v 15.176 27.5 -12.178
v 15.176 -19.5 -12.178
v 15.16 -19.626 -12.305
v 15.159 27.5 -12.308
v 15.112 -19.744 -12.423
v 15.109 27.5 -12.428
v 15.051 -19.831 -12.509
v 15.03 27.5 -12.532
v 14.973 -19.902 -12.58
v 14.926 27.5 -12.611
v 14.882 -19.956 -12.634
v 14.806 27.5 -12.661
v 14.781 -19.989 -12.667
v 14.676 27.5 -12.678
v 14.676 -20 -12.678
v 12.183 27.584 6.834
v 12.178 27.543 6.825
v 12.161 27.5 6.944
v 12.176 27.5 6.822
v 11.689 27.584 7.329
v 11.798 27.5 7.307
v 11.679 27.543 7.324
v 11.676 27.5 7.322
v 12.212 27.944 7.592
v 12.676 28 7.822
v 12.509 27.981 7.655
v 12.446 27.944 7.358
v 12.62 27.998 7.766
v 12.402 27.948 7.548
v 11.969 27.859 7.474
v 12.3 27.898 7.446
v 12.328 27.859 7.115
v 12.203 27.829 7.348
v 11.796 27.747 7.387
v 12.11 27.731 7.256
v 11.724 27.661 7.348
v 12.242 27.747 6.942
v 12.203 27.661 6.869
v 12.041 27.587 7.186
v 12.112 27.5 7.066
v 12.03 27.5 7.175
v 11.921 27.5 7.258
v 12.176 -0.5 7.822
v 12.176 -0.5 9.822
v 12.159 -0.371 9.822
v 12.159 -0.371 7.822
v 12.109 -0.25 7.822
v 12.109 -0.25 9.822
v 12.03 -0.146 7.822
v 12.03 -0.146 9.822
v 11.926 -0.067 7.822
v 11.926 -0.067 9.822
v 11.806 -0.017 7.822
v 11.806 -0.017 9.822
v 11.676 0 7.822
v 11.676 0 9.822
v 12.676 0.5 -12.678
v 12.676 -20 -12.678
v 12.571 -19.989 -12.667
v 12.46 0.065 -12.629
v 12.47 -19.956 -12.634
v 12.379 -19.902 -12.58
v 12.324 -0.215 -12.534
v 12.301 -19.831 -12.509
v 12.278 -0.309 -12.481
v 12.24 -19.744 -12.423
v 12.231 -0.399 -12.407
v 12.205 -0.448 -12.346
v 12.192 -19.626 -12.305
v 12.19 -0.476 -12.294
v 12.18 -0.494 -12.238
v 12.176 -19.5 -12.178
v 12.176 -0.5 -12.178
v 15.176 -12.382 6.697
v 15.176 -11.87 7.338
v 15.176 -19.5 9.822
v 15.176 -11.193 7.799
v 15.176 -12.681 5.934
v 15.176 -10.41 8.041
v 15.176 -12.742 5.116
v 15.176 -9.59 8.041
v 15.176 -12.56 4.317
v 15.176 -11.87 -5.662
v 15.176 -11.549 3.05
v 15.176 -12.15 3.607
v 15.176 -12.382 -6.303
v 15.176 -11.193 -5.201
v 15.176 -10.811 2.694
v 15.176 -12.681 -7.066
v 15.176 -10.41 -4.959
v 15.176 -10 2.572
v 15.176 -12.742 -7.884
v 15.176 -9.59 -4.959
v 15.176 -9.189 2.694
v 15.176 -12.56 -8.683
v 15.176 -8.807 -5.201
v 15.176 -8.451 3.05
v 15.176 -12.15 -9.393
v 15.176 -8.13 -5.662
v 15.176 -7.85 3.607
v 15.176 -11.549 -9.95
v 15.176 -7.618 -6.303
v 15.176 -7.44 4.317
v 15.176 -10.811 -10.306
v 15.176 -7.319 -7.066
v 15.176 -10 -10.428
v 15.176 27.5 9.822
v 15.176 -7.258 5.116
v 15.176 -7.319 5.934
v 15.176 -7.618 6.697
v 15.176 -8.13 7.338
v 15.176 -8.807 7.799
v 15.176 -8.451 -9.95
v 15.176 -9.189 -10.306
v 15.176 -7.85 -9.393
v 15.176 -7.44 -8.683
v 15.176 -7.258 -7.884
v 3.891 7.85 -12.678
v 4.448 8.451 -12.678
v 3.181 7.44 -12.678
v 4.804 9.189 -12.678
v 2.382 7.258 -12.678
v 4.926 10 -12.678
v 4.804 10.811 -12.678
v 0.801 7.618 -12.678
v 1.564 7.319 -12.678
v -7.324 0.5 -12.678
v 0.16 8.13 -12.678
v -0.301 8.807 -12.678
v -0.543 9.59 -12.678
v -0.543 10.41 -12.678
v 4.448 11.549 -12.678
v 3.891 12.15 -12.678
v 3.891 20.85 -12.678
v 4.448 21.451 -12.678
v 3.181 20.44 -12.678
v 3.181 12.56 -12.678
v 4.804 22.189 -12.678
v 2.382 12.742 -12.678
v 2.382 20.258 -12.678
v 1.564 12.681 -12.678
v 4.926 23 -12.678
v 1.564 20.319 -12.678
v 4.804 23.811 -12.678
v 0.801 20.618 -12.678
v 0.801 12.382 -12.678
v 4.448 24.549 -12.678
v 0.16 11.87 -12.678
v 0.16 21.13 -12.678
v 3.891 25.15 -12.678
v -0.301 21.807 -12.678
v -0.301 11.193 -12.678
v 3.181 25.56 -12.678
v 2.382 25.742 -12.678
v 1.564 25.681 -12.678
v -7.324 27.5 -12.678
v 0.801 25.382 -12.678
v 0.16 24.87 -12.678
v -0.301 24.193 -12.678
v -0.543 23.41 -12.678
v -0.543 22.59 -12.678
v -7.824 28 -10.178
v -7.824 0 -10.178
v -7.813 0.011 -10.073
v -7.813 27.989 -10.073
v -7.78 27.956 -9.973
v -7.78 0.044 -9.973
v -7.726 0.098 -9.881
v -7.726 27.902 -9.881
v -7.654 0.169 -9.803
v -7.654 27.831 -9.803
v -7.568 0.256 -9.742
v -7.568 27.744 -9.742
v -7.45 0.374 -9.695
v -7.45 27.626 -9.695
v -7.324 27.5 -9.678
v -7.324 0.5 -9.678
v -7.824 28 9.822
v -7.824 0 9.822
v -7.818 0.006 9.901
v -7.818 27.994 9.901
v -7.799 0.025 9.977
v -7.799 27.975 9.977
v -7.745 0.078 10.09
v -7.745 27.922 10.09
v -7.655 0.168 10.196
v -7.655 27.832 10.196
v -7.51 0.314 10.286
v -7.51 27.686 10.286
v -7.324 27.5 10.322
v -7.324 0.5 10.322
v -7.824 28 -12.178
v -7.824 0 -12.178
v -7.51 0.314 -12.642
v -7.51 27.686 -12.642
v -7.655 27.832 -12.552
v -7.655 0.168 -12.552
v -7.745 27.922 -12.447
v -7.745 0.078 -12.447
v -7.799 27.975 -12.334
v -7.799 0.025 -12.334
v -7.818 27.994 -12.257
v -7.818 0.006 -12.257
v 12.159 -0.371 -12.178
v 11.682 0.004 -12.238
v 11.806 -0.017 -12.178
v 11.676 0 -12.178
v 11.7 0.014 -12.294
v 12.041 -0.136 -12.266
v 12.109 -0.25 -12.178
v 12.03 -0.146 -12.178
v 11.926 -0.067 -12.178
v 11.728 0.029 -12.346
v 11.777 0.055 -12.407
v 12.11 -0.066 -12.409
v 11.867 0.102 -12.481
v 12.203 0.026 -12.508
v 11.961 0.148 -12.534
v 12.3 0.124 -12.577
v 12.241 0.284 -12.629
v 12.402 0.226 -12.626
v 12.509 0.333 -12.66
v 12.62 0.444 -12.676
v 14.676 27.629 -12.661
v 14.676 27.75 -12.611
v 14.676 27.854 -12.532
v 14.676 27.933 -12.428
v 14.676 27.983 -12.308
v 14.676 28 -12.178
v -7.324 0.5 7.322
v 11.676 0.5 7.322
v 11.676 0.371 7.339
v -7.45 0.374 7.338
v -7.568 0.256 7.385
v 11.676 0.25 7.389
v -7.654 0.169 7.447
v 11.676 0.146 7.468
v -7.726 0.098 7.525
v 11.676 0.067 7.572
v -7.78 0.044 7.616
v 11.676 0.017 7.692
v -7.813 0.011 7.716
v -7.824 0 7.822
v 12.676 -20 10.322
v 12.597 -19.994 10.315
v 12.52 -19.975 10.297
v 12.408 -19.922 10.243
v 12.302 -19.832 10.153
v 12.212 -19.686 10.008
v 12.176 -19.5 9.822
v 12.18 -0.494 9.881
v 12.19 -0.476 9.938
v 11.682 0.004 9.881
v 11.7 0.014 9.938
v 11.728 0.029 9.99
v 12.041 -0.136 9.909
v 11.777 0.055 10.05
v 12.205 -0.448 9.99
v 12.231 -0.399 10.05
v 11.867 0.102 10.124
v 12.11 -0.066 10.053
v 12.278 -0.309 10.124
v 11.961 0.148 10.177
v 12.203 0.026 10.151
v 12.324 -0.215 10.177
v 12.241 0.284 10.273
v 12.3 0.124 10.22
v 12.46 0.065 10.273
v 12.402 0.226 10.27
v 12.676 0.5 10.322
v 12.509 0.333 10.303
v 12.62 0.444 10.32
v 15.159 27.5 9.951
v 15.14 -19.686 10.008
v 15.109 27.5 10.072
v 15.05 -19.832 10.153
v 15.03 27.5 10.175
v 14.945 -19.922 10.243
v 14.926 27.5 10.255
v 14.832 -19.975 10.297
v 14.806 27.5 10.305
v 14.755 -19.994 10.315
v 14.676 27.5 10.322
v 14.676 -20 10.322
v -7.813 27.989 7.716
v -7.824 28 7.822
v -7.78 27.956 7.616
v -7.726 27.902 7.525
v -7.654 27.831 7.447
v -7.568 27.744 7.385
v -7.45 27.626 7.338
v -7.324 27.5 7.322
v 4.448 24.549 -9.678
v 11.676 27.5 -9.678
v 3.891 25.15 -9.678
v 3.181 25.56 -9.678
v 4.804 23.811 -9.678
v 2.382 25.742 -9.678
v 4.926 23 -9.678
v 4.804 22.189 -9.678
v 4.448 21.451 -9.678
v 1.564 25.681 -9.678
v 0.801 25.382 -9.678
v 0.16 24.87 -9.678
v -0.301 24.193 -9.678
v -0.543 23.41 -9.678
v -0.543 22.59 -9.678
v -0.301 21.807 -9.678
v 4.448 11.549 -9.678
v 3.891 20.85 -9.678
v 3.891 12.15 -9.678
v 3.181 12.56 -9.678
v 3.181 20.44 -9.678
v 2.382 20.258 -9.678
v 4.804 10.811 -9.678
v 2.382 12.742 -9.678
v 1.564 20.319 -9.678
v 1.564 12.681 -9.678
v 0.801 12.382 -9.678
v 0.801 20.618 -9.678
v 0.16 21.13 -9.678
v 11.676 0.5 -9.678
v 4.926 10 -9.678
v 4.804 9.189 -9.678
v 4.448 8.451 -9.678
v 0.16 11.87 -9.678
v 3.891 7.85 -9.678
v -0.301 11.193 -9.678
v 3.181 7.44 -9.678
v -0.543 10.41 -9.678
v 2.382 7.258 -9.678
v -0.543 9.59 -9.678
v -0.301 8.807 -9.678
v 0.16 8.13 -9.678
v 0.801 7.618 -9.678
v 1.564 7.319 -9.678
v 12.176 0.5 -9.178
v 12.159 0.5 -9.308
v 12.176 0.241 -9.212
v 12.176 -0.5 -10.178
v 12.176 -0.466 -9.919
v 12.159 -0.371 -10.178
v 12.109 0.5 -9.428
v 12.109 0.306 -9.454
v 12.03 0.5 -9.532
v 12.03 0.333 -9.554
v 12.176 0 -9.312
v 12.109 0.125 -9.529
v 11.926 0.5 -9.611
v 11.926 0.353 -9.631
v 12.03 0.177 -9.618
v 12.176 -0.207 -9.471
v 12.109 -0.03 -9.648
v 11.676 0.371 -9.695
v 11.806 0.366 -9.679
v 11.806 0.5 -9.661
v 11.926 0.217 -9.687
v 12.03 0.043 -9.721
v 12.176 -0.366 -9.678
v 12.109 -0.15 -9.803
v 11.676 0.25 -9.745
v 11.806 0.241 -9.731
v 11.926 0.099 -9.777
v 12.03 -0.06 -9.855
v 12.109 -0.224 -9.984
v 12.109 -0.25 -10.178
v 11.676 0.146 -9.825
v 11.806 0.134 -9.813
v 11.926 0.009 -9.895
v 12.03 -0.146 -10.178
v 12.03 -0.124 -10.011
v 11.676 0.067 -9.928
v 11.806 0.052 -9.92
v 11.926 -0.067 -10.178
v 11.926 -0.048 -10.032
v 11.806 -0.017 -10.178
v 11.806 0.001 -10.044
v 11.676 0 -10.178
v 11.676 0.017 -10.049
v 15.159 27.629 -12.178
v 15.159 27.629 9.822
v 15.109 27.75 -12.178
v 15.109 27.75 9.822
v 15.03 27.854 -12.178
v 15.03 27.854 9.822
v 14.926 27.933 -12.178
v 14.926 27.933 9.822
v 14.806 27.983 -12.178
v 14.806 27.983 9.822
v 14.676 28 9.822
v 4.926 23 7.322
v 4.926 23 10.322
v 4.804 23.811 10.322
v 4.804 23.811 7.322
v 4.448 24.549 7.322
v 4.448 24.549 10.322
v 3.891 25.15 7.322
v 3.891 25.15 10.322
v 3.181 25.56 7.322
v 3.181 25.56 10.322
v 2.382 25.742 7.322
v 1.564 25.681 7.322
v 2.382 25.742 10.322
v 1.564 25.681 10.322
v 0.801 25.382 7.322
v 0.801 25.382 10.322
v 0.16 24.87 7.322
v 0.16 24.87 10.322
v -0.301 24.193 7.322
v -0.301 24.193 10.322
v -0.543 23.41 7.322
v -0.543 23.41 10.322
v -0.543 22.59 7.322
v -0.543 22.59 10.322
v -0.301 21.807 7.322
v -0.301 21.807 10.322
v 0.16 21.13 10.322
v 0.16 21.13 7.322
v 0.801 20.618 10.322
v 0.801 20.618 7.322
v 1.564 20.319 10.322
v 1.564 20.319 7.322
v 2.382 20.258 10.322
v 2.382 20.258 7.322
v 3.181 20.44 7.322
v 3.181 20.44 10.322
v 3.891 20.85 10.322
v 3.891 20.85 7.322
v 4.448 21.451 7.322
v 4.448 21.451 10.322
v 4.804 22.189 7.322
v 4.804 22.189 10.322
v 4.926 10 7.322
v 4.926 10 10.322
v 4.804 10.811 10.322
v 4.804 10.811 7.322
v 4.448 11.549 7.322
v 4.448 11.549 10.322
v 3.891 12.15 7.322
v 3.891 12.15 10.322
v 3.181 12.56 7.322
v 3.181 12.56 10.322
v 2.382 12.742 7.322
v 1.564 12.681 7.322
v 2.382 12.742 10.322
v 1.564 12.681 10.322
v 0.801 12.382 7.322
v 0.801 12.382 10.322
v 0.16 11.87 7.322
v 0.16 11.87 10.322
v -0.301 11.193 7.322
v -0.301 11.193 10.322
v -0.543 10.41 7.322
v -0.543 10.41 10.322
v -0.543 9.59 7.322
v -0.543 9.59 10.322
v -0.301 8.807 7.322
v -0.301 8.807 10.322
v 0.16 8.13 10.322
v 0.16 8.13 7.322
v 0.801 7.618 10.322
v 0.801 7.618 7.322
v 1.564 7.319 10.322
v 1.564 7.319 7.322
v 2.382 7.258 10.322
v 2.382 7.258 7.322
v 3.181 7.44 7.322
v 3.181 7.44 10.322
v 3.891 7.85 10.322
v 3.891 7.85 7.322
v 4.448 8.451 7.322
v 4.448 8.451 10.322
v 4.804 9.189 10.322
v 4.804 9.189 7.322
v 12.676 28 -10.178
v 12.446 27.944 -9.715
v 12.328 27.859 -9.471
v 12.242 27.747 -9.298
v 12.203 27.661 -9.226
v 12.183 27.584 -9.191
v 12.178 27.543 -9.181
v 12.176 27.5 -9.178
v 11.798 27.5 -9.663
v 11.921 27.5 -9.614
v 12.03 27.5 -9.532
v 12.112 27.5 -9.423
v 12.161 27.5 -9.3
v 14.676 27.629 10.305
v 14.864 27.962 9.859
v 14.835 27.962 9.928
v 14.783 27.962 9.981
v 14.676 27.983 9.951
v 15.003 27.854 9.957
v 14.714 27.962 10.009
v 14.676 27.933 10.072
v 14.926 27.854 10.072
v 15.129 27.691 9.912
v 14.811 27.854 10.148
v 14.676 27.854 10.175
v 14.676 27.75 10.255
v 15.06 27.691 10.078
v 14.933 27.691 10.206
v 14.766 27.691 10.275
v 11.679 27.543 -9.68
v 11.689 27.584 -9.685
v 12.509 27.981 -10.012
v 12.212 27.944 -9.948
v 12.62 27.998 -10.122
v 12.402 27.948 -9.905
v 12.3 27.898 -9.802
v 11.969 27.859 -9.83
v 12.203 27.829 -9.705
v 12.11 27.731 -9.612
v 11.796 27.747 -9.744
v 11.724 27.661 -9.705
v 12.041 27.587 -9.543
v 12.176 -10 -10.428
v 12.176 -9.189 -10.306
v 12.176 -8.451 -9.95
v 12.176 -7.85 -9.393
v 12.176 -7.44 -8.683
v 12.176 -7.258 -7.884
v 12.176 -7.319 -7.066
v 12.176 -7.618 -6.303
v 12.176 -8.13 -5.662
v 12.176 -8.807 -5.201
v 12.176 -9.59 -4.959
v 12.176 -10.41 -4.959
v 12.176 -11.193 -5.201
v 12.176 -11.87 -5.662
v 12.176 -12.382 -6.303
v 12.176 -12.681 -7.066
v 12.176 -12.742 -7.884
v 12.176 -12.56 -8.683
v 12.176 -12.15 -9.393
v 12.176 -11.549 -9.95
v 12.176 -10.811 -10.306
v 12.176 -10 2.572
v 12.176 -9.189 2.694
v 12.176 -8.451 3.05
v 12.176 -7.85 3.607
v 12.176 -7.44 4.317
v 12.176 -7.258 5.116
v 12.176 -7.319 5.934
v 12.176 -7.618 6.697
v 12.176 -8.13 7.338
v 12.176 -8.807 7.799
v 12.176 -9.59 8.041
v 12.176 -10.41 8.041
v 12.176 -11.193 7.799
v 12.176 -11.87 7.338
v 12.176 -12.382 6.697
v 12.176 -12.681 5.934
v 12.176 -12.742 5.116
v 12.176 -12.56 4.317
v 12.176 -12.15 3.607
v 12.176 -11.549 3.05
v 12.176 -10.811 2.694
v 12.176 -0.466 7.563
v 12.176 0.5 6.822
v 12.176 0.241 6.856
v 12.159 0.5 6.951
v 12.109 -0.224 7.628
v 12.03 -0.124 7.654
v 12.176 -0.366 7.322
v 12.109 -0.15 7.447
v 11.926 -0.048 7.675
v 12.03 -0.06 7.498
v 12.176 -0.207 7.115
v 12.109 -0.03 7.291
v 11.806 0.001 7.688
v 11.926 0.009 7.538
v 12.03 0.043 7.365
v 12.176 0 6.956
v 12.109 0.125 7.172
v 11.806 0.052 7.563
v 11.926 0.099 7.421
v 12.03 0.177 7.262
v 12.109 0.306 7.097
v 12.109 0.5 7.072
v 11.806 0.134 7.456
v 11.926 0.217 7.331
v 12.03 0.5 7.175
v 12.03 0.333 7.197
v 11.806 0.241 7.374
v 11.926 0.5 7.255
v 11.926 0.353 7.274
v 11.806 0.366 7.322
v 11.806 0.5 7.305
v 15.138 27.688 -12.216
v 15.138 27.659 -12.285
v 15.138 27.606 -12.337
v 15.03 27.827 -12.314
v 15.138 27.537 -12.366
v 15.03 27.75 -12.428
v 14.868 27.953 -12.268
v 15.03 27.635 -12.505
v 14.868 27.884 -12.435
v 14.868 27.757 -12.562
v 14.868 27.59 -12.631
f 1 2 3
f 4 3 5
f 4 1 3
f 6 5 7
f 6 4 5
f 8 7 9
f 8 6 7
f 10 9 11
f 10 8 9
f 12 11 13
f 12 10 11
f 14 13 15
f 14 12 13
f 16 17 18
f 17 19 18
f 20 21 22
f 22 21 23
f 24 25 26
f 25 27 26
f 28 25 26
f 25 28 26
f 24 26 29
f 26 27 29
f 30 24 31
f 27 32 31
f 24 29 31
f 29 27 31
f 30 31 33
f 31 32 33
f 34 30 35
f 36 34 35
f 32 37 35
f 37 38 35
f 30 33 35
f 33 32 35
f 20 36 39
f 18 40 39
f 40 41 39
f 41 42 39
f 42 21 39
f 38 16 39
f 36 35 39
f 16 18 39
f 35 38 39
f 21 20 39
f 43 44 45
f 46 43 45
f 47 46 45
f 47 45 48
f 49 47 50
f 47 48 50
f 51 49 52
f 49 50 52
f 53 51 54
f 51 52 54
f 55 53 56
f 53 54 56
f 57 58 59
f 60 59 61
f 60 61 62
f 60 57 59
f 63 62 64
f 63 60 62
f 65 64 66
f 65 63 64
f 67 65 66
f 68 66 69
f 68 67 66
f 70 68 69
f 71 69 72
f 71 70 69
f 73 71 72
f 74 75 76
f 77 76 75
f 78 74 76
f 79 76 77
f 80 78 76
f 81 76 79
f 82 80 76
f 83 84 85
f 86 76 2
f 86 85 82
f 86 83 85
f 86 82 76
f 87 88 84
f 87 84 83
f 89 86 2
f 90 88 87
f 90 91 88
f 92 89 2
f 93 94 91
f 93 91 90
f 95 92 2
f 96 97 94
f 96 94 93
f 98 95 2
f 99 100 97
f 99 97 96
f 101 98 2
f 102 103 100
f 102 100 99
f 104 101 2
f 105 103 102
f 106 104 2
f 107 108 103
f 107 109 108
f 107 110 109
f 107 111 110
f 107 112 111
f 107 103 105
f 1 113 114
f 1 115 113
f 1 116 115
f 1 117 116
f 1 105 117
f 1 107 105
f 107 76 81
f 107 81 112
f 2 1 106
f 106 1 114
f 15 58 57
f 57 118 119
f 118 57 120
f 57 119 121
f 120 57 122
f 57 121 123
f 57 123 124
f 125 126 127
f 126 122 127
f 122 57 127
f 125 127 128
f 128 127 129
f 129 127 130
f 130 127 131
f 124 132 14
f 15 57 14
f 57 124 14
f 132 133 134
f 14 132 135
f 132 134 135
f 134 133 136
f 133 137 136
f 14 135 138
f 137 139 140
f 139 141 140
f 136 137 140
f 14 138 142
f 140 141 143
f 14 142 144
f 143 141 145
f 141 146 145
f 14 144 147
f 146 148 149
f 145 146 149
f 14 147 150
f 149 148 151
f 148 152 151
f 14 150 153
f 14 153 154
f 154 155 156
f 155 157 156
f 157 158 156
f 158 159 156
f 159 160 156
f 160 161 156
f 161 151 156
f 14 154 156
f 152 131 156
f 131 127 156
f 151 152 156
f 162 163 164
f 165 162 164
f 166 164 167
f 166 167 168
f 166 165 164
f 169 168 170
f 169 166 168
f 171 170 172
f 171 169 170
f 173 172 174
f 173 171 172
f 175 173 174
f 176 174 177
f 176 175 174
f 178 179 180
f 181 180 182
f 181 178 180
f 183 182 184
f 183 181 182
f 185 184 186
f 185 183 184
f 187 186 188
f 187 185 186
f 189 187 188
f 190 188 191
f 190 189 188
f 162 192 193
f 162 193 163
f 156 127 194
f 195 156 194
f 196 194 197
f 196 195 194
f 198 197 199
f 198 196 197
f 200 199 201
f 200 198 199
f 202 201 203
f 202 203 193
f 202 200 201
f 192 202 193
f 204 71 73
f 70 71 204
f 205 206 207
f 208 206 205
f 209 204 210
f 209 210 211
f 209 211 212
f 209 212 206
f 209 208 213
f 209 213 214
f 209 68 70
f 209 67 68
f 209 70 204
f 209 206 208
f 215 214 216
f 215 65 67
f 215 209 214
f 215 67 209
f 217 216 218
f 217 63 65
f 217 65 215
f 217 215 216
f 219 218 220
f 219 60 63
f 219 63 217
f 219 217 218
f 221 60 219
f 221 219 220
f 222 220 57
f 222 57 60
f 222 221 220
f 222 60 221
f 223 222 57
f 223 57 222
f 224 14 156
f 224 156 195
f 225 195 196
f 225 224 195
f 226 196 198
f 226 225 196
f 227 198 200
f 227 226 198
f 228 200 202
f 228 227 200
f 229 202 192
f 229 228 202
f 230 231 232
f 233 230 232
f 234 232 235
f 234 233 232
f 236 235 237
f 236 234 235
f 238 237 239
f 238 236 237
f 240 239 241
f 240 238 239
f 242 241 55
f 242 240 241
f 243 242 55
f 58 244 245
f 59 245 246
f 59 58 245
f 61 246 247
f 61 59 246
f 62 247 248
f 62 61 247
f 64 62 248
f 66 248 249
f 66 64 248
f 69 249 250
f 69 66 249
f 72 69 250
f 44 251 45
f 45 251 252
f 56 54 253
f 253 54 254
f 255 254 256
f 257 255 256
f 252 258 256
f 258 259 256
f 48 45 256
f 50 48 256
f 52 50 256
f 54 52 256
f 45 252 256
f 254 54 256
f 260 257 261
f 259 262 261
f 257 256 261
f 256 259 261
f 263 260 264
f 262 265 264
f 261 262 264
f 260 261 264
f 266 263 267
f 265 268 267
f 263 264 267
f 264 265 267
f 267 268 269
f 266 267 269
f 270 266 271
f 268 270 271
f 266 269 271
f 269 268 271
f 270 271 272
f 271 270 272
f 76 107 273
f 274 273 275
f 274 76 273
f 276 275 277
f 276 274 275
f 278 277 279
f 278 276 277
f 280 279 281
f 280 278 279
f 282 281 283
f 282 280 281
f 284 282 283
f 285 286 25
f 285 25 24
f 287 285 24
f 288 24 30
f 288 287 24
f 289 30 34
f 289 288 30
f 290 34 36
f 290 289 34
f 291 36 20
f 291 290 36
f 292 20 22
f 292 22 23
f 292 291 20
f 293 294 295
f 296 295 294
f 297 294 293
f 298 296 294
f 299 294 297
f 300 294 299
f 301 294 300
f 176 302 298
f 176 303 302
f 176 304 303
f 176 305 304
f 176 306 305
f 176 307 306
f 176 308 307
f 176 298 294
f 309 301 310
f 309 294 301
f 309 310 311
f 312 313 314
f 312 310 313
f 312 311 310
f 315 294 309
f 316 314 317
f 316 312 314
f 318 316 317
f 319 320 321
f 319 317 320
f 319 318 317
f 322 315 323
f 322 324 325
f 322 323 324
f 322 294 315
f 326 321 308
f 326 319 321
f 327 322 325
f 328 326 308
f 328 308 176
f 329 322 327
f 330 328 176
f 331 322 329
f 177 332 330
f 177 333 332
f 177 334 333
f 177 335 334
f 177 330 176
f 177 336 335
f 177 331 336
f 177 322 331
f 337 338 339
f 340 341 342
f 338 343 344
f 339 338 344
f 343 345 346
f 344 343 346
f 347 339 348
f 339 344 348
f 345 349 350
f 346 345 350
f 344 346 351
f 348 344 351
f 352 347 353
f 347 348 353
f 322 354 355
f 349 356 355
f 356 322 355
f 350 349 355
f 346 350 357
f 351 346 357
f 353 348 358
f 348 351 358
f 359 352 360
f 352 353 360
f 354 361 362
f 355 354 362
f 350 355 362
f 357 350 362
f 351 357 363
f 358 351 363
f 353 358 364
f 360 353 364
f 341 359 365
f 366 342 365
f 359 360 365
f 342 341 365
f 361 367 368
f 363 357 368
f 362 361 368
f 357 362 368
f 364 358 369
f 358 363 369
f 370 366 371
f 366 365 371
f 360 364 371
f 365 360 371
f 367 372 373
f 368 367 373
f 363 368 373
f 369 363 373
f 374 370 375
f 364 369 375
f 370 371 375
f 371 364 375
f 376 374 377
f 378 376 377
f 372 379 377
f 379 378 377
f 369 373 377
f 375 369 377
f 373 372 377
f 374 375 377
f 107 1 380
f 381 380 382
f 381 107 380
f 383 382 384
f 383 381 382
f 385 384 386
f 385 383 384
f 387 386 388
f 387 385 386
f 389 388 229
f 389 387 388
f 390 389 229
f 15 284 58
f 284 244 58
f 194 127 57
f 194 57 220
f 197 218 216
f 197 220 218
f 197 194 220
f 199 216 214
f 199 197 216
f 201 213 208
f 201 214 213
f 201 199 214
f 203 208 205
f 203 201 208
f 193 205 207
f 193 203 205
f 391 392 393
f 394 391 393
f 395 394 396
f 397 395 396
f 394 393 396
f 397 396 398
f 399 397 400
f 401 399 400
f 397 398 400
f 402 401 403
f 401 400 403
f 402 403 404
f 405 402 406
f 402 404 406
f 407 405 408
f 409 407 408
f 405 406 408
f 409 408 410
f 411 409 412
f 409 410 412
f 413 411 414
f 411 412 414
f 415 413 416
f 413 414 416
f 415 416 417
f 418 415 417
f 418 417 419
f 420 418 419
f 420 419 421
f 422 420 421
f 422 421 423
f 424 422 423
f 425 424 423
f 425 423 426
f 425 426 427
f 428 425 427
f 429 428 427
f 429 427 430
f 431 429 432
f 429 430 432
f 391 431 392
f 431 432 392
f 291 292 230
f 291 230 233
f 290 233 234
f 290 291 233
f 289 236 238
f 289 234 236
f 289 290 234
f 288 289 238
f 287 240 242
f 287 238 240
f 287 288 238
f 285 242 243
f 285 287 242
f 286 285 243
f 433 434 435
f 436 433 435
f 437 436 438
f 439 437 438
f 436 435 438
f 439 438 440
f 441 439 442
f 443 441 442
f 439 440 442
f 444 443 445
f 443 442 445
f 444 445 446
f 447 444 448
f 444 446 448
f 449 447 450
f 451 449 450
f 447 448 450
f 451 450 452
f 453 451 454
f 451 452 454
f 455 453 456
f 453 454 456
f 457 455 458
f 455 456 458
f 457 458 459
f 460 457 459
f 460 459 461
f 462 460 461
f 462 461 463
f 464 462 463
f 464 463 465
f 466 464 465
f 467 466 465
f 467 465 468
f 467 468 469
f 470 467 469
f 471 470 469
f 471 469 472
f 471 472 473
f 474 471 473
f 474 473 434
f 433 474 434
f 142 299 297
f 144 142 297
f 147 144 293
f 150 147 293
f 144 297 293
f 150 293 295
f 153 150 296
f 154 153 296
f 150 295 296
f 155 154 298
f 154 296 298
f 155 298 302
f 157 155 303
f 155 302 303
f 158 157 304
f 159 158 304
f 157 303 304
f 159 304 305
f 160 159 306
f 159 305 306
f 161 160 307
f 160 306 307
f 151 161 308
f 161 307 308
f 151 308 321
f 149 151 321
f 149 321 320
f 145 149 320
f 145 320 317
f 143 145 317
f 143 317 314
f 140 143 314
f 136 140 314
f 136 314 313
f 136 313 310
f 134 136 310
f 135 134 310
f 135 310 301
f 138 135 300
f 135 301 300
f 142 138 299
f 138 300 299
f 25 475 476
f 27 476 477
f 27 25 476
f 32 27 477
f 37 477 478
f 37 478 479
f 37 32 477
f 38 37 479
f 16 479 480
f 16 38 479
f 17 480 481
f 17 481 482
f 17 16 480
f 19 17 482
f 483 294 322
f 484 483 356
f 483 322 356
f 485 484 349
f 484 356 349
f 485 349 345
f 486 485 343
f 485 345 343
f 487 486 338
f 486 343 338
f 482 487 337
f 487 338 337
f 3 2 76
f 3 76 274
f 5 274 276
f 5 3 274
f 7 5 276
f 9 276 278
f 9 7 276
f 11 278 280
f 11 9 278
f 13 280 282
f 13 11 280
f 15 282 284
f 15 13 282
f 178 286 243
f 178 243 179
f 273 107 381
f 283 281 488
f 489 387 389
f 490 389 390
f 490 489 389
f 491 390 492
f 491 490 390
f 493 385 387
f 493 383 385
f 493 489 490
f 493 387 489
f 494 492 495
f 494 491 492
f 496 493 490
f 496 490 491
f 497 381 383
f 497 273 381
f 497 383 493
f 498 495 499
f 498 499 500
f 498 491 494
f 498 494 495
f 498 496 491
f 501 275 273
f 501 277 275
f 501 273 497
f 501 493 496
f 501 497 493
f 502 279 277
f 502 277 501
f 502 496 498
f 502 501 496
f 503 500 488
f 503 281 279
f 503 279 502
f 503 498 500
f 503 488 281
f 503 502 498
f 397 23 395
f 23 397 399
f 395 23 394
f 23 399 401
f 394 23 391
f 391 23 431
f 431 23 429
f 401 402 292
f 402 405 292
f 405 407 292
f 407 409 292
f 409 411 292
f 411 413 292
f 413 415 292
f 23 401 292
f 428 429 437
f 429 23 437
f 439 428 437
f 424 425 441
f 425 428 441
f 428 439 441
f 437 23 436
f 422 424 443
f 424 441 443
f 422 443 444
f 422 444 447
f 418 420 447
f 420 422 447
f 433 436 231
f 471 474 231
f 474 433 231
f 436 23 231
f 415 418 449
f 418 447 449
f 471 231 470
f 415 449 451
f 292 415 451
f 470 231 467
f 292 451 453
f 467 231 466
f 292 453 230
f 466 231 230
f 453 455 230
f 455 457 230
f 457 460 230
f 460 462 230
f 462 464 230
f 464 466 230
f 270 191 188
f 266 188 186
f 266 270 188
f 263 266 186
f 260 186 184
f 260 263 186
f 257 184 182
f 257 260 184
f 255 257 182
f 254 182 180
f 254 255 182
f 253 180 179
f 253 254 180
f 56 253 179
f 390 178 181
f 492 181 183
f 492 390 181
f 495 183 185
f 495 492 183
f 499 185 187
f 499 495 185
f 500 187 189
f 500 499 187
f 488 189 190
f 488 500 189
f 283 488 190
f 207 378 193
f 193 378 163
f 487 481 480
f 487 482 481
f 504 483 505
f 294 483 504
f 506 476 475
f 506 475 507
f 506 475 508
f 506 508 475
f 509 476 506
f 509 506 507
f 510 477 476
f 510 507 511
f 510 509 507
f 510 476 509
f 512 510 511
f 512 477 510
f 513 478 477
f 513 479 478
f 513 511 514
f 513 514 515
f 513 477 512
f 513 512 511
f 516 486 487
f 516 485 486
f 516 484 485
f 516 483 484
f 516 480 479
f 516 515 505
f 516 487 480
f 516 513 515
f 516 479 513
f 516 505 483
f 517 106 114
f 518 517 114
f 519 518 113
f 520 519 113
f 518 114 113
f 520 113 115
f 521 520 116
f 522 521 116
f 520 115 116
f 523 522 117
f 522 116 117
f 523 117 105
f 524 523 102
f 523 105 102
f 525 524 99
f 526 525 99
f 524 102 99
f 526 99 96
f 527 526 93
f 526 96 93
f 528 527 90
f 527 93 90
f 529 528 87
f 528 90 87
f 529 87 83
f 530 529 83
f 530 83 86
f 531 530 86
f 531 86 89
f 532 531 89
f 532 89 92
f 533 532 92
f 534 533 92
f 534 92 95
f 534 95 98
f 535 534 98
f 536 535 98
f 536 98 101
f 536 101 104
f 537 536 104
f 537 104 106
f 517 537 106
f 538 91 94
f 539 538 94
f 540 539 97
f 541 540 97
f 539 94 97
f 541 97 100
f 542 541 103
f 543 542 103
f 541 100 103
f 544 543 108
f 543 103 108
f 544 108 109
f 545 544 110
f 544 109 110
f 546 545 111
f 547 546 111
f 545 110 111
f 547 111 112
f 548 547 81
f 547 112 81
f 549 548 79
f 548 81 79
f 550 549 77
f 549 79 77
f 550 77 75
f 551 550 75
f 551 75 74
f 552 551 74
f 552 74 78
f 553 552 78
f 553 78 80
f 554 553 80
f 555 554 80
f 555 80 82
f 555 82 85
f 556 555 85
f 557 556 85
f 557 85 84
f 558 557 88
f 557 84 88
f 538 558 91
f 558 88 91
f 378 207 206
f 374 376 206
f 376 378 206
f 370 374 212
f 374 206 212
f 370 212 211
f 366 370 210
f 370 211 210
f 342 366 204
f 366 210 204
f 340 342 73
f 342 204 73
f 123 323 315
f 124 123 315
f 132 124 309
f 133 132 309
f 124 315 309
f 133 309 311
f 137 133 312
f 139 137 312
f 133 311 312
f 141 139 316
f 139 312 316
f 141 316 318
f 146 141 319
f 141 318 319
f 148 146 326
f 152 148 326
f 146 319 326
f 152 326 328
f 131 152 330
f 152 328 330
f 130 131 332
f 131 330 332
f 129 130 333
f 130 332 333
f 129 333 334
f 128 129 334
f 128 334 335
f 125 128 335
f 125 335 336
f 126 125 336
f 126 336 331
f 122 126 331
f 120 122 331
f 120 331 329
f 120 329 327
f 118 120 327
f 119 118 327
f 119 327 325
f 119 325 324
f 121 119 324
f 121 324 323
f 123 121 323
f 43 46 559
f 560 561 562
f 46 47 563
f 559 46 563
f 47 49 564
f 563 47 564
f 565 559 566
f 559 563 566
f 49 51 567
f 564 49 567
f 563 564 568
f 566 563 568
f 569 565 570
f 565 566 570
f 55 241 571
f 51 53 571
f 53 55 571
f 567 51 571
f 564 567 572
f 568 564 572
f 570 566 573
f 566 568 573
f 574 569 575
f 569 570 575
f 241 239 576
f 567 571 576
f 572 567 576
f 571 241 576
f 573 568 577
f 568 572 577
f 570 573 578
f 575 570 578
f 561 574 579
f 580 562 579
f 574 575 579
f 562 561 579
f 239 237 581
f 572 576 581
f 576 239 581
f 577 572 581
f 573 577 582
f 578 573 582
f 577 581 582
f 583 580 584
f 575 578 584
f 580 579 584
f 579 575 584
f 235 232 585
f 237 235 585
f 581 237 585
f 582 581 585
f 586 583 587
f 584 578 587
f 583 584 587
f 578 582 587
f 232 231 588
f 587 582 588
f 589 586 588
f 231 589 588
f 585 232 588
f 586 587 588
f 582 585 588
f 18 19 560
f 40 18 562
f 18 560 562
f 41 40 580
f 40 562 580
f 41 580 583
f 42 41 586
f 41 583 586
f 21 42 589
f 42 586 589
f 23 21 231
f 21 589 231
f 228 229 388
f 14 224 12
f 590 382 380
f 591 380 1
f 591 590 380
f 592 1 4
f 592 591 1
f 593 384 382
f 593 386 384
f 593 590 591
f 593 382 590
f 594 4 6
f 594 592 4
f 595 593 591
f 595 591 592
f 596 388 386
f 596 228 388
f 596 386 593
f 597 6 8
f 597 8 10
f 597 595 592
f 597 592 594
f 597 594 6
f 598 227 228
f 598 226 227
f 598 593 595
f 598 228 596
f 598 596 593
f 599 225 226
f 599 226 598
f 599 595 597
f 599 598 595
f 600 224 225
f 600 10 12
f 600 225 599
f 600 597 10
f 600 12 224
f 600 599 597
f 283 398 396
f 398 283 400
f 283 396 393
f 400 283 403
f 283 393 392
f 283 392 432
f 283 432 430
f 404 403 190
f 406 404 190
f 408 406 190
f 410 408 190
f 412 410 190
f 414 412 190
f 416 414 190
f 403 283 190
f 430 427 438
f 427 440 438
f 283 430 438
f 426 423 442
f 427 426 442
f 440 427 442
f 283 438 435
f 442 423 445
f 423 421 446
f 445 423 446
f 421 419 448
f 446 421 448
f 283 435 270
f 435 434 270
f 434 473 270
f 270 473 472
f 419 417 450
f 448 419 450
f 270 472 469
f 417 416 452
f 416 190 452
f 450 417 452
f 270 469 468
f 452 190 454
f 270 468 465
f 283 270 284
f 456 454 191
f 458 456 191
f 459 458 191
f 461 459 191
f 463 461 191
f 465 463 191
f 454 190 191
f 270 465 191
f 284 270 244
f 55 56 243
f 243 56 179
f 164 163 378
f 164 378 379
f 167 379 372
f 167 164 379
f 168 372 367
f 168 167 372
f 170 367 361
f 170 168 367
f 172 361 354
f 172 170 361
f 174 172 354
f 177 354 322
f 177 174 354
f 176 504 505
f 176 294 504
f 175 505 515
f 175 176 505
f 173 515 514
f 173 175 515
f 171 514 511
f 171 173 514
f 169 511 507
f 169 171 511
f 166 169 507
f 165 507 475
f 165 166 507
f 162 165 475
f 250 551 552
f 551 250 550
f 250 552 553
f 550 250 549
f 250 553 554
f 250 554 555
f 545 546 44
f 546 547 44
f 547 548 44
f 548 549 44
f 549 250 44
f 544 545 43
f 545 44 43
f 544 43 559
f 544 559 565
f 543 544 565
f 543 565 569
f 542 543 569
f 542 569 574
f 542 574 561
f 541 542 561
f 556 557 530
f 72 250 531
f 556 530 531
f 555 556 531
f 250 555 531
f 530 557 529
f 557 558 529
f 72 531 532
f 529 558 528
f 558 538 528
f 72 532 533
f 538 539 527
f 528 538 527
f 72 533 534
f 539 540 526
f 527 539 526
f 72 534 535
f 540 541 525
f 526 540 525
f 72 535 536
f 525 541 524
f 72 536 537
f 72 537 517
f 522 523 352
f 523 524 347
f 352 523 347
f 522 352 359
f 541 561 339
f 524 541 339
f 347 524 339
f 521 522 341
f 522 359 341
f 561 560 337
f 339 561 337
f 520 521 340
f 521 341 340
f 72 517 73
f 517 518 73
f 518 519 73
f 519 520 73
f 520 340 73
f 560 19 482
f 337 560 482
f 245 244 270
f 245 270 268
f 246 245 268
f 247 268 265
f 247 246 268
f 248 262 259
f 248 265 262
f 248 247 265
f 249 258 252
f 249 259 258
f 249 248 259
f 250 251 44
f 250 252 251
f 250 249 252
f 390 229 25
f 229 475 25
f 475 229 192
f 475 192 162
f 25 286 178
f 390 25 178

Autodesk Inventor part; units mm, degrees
ref_plane "YZ Plane" through (0, 0, 0) normal (1, 0, 0) x (0, 1, 0)
ref_plane "XZ Plane" through (0, 0, 0) normal (0, 1, 0) x (-1, 0, 0)
ref_plane "XY Plane" through (0, 0, 0) normal (0, 0, 1) x (1, 0, 0)
sketch "Sketch1" plane through (0, 0, 0) normal (0, 1, 0) x (-1, 0, 0)
  line L0 (7.8238, 10.3217) -> (-12.1762, 10.3217)
  line L1 (-12.1762, 10.3217) -> (-12.1762, -12.6783)
  line L2 (-12.1762, -12.6783) -> (7.8238, -12.6783)
  line L3 (7.8238, -12.6783) -> (7.8238, 10.3217)
  line L4 (7.8238, 10.3217) -> (-12.1762, 10.3217)
  line L5 (-12.1762, 10.3217) -> (-12.1762, 7.3217)
  line L6 (-12.1762, 7.3217) -> (7.8238, 7.3217)
  line L7 (7.8238, 7.3217) -> (7.8238, 10.3217)
  line L8 (7.8238, -12.6783) -> (-12.1762, -12.6783)
  line L9 (-12.1762, -12.6783) -> (-12.1762, -9.6783)
  line L10 (-12.1762, -9.6783) -> (7.8238, -9.6783)
  line L11 (7.8238, -9.6783) -> (7.8238, -12.6783)
  point P0 (0, 0)
  dimension "d0" = 23
  dimension "d1" = 20
  dimension "d2" = 3
  dimension "d3" = 3
extrude "Extrusion1" add sketch "Sketch1" along normal blind 28 contours L3 L6 L1 L0 | L3 L2 L1 L10
sketch "Sketch2" plane through (-7.8238, 0, 10.3217) normal (0, 0, 1) x (1, 0, 0)
  circle A0 centre (10, 10) radius 2.75
  circle A1 centre (10, 23) radius 2.75
  line L0 (0, 0) -> (20, 0) projected
  line L1 (0, 28) -> (20, 28) projected
  line L2 (0, 0) -> (0, 28) projected
  point P0 (7.8238, 0)
  dimension "d6" = 5.5
  dimension "d7" = 5.5
  dimension "d8" = 10
  dimension "d9" = 5
  dimension "d10" = 10
extrude "Extrusion2" cut sketch "Sketch2" against normal through all
sketch "Sketch3" plane through (12.1762, 0, -9.6783) normal (1, 0, 0) x (0, 0, -1)
  line L0 (3, 28) -> (-20, 28)
  line L1 (-20, 28) -> (-20, -20)
  line L2 (-20, -20) -> (3, -20)
  line L3 (3, -20) -> (3, 28)
  point P0 (-9.6783, 0)
  dimension "d13" = 48
extrude "Extrusion3" add sketch "Sketch3" along normal blind 3
sketch "Sketch4" plane through (15.1762, 0, -9.6783) normal (1, 0, 0) x (0, 0, -1)
  circle A0 centre (-15, -10) radius 2.75
  line L0 (-20, -20) -> (3, -20) projected
  line L1 (-20, 28) -> (-20, -20) projected
  circle A1 centre (-2, -10) radius 2.75
  line L2 (3, -20) -> (3, 28) projected
  point P0 (-9.6783, 0)
  dimension "d16" = 5.5
  dimension "d17" = 10
  dimension "d18" = 5
  dimension "d21" = 13
  dimension "d26" = 5
extrude "Extrusion4" cut sketch "Sketch4" against normal blind 3
fillet "Fillet1" radius 0.5 3 edges at (12.1762, -10, 10.3217) (15.1762, 4, 10.3217) (-7.8238, 14, 10.3217)
fillet "Fillet1" radius 0.5 17 edges at (-7.8238, 14, 7.3217) (-7.8238, 14, -9.6783) (-7.8238, 14, -12.6783) (2.1762, 28, 7.3217) (12.1762, 28, -1.1783) (2.1762, 28, -9.6783) (3.6762, 28, -12.6783) (15.1762, 28, -1.1783) (3.6762, 28, 10.3217) (12.1762, -10, -12.6783) (15.1762, 4, -12.6783) (12.1762, -20, -1.1783) (15.1762, -20, -1.1783) (2.1762, 0, 7.3217) (2.1762, 0, 10.3217) (2.1762, 0, -9.6783) (2.1762, 0, -12.6783)
fillet "Fillet2" radius 0.5 10 edges at (12.3227, 27.8536, 7.4682) (12.1762, 0.1464, 7.4682) (12.1762, 0, 8.8217) (12.3227, 0.1464, 10.1753) (12.1762, 14, 7.3217) (12.3227, 27.8536, -9.8247) (12.1762, 0.1464, -9.8247) (12.1762, 0, -11.1783) (12.3227, 0.1464, -12.5318) (12.1762, 14, -9.6783)
properties part number "bottom printhead screwplate_250221"
